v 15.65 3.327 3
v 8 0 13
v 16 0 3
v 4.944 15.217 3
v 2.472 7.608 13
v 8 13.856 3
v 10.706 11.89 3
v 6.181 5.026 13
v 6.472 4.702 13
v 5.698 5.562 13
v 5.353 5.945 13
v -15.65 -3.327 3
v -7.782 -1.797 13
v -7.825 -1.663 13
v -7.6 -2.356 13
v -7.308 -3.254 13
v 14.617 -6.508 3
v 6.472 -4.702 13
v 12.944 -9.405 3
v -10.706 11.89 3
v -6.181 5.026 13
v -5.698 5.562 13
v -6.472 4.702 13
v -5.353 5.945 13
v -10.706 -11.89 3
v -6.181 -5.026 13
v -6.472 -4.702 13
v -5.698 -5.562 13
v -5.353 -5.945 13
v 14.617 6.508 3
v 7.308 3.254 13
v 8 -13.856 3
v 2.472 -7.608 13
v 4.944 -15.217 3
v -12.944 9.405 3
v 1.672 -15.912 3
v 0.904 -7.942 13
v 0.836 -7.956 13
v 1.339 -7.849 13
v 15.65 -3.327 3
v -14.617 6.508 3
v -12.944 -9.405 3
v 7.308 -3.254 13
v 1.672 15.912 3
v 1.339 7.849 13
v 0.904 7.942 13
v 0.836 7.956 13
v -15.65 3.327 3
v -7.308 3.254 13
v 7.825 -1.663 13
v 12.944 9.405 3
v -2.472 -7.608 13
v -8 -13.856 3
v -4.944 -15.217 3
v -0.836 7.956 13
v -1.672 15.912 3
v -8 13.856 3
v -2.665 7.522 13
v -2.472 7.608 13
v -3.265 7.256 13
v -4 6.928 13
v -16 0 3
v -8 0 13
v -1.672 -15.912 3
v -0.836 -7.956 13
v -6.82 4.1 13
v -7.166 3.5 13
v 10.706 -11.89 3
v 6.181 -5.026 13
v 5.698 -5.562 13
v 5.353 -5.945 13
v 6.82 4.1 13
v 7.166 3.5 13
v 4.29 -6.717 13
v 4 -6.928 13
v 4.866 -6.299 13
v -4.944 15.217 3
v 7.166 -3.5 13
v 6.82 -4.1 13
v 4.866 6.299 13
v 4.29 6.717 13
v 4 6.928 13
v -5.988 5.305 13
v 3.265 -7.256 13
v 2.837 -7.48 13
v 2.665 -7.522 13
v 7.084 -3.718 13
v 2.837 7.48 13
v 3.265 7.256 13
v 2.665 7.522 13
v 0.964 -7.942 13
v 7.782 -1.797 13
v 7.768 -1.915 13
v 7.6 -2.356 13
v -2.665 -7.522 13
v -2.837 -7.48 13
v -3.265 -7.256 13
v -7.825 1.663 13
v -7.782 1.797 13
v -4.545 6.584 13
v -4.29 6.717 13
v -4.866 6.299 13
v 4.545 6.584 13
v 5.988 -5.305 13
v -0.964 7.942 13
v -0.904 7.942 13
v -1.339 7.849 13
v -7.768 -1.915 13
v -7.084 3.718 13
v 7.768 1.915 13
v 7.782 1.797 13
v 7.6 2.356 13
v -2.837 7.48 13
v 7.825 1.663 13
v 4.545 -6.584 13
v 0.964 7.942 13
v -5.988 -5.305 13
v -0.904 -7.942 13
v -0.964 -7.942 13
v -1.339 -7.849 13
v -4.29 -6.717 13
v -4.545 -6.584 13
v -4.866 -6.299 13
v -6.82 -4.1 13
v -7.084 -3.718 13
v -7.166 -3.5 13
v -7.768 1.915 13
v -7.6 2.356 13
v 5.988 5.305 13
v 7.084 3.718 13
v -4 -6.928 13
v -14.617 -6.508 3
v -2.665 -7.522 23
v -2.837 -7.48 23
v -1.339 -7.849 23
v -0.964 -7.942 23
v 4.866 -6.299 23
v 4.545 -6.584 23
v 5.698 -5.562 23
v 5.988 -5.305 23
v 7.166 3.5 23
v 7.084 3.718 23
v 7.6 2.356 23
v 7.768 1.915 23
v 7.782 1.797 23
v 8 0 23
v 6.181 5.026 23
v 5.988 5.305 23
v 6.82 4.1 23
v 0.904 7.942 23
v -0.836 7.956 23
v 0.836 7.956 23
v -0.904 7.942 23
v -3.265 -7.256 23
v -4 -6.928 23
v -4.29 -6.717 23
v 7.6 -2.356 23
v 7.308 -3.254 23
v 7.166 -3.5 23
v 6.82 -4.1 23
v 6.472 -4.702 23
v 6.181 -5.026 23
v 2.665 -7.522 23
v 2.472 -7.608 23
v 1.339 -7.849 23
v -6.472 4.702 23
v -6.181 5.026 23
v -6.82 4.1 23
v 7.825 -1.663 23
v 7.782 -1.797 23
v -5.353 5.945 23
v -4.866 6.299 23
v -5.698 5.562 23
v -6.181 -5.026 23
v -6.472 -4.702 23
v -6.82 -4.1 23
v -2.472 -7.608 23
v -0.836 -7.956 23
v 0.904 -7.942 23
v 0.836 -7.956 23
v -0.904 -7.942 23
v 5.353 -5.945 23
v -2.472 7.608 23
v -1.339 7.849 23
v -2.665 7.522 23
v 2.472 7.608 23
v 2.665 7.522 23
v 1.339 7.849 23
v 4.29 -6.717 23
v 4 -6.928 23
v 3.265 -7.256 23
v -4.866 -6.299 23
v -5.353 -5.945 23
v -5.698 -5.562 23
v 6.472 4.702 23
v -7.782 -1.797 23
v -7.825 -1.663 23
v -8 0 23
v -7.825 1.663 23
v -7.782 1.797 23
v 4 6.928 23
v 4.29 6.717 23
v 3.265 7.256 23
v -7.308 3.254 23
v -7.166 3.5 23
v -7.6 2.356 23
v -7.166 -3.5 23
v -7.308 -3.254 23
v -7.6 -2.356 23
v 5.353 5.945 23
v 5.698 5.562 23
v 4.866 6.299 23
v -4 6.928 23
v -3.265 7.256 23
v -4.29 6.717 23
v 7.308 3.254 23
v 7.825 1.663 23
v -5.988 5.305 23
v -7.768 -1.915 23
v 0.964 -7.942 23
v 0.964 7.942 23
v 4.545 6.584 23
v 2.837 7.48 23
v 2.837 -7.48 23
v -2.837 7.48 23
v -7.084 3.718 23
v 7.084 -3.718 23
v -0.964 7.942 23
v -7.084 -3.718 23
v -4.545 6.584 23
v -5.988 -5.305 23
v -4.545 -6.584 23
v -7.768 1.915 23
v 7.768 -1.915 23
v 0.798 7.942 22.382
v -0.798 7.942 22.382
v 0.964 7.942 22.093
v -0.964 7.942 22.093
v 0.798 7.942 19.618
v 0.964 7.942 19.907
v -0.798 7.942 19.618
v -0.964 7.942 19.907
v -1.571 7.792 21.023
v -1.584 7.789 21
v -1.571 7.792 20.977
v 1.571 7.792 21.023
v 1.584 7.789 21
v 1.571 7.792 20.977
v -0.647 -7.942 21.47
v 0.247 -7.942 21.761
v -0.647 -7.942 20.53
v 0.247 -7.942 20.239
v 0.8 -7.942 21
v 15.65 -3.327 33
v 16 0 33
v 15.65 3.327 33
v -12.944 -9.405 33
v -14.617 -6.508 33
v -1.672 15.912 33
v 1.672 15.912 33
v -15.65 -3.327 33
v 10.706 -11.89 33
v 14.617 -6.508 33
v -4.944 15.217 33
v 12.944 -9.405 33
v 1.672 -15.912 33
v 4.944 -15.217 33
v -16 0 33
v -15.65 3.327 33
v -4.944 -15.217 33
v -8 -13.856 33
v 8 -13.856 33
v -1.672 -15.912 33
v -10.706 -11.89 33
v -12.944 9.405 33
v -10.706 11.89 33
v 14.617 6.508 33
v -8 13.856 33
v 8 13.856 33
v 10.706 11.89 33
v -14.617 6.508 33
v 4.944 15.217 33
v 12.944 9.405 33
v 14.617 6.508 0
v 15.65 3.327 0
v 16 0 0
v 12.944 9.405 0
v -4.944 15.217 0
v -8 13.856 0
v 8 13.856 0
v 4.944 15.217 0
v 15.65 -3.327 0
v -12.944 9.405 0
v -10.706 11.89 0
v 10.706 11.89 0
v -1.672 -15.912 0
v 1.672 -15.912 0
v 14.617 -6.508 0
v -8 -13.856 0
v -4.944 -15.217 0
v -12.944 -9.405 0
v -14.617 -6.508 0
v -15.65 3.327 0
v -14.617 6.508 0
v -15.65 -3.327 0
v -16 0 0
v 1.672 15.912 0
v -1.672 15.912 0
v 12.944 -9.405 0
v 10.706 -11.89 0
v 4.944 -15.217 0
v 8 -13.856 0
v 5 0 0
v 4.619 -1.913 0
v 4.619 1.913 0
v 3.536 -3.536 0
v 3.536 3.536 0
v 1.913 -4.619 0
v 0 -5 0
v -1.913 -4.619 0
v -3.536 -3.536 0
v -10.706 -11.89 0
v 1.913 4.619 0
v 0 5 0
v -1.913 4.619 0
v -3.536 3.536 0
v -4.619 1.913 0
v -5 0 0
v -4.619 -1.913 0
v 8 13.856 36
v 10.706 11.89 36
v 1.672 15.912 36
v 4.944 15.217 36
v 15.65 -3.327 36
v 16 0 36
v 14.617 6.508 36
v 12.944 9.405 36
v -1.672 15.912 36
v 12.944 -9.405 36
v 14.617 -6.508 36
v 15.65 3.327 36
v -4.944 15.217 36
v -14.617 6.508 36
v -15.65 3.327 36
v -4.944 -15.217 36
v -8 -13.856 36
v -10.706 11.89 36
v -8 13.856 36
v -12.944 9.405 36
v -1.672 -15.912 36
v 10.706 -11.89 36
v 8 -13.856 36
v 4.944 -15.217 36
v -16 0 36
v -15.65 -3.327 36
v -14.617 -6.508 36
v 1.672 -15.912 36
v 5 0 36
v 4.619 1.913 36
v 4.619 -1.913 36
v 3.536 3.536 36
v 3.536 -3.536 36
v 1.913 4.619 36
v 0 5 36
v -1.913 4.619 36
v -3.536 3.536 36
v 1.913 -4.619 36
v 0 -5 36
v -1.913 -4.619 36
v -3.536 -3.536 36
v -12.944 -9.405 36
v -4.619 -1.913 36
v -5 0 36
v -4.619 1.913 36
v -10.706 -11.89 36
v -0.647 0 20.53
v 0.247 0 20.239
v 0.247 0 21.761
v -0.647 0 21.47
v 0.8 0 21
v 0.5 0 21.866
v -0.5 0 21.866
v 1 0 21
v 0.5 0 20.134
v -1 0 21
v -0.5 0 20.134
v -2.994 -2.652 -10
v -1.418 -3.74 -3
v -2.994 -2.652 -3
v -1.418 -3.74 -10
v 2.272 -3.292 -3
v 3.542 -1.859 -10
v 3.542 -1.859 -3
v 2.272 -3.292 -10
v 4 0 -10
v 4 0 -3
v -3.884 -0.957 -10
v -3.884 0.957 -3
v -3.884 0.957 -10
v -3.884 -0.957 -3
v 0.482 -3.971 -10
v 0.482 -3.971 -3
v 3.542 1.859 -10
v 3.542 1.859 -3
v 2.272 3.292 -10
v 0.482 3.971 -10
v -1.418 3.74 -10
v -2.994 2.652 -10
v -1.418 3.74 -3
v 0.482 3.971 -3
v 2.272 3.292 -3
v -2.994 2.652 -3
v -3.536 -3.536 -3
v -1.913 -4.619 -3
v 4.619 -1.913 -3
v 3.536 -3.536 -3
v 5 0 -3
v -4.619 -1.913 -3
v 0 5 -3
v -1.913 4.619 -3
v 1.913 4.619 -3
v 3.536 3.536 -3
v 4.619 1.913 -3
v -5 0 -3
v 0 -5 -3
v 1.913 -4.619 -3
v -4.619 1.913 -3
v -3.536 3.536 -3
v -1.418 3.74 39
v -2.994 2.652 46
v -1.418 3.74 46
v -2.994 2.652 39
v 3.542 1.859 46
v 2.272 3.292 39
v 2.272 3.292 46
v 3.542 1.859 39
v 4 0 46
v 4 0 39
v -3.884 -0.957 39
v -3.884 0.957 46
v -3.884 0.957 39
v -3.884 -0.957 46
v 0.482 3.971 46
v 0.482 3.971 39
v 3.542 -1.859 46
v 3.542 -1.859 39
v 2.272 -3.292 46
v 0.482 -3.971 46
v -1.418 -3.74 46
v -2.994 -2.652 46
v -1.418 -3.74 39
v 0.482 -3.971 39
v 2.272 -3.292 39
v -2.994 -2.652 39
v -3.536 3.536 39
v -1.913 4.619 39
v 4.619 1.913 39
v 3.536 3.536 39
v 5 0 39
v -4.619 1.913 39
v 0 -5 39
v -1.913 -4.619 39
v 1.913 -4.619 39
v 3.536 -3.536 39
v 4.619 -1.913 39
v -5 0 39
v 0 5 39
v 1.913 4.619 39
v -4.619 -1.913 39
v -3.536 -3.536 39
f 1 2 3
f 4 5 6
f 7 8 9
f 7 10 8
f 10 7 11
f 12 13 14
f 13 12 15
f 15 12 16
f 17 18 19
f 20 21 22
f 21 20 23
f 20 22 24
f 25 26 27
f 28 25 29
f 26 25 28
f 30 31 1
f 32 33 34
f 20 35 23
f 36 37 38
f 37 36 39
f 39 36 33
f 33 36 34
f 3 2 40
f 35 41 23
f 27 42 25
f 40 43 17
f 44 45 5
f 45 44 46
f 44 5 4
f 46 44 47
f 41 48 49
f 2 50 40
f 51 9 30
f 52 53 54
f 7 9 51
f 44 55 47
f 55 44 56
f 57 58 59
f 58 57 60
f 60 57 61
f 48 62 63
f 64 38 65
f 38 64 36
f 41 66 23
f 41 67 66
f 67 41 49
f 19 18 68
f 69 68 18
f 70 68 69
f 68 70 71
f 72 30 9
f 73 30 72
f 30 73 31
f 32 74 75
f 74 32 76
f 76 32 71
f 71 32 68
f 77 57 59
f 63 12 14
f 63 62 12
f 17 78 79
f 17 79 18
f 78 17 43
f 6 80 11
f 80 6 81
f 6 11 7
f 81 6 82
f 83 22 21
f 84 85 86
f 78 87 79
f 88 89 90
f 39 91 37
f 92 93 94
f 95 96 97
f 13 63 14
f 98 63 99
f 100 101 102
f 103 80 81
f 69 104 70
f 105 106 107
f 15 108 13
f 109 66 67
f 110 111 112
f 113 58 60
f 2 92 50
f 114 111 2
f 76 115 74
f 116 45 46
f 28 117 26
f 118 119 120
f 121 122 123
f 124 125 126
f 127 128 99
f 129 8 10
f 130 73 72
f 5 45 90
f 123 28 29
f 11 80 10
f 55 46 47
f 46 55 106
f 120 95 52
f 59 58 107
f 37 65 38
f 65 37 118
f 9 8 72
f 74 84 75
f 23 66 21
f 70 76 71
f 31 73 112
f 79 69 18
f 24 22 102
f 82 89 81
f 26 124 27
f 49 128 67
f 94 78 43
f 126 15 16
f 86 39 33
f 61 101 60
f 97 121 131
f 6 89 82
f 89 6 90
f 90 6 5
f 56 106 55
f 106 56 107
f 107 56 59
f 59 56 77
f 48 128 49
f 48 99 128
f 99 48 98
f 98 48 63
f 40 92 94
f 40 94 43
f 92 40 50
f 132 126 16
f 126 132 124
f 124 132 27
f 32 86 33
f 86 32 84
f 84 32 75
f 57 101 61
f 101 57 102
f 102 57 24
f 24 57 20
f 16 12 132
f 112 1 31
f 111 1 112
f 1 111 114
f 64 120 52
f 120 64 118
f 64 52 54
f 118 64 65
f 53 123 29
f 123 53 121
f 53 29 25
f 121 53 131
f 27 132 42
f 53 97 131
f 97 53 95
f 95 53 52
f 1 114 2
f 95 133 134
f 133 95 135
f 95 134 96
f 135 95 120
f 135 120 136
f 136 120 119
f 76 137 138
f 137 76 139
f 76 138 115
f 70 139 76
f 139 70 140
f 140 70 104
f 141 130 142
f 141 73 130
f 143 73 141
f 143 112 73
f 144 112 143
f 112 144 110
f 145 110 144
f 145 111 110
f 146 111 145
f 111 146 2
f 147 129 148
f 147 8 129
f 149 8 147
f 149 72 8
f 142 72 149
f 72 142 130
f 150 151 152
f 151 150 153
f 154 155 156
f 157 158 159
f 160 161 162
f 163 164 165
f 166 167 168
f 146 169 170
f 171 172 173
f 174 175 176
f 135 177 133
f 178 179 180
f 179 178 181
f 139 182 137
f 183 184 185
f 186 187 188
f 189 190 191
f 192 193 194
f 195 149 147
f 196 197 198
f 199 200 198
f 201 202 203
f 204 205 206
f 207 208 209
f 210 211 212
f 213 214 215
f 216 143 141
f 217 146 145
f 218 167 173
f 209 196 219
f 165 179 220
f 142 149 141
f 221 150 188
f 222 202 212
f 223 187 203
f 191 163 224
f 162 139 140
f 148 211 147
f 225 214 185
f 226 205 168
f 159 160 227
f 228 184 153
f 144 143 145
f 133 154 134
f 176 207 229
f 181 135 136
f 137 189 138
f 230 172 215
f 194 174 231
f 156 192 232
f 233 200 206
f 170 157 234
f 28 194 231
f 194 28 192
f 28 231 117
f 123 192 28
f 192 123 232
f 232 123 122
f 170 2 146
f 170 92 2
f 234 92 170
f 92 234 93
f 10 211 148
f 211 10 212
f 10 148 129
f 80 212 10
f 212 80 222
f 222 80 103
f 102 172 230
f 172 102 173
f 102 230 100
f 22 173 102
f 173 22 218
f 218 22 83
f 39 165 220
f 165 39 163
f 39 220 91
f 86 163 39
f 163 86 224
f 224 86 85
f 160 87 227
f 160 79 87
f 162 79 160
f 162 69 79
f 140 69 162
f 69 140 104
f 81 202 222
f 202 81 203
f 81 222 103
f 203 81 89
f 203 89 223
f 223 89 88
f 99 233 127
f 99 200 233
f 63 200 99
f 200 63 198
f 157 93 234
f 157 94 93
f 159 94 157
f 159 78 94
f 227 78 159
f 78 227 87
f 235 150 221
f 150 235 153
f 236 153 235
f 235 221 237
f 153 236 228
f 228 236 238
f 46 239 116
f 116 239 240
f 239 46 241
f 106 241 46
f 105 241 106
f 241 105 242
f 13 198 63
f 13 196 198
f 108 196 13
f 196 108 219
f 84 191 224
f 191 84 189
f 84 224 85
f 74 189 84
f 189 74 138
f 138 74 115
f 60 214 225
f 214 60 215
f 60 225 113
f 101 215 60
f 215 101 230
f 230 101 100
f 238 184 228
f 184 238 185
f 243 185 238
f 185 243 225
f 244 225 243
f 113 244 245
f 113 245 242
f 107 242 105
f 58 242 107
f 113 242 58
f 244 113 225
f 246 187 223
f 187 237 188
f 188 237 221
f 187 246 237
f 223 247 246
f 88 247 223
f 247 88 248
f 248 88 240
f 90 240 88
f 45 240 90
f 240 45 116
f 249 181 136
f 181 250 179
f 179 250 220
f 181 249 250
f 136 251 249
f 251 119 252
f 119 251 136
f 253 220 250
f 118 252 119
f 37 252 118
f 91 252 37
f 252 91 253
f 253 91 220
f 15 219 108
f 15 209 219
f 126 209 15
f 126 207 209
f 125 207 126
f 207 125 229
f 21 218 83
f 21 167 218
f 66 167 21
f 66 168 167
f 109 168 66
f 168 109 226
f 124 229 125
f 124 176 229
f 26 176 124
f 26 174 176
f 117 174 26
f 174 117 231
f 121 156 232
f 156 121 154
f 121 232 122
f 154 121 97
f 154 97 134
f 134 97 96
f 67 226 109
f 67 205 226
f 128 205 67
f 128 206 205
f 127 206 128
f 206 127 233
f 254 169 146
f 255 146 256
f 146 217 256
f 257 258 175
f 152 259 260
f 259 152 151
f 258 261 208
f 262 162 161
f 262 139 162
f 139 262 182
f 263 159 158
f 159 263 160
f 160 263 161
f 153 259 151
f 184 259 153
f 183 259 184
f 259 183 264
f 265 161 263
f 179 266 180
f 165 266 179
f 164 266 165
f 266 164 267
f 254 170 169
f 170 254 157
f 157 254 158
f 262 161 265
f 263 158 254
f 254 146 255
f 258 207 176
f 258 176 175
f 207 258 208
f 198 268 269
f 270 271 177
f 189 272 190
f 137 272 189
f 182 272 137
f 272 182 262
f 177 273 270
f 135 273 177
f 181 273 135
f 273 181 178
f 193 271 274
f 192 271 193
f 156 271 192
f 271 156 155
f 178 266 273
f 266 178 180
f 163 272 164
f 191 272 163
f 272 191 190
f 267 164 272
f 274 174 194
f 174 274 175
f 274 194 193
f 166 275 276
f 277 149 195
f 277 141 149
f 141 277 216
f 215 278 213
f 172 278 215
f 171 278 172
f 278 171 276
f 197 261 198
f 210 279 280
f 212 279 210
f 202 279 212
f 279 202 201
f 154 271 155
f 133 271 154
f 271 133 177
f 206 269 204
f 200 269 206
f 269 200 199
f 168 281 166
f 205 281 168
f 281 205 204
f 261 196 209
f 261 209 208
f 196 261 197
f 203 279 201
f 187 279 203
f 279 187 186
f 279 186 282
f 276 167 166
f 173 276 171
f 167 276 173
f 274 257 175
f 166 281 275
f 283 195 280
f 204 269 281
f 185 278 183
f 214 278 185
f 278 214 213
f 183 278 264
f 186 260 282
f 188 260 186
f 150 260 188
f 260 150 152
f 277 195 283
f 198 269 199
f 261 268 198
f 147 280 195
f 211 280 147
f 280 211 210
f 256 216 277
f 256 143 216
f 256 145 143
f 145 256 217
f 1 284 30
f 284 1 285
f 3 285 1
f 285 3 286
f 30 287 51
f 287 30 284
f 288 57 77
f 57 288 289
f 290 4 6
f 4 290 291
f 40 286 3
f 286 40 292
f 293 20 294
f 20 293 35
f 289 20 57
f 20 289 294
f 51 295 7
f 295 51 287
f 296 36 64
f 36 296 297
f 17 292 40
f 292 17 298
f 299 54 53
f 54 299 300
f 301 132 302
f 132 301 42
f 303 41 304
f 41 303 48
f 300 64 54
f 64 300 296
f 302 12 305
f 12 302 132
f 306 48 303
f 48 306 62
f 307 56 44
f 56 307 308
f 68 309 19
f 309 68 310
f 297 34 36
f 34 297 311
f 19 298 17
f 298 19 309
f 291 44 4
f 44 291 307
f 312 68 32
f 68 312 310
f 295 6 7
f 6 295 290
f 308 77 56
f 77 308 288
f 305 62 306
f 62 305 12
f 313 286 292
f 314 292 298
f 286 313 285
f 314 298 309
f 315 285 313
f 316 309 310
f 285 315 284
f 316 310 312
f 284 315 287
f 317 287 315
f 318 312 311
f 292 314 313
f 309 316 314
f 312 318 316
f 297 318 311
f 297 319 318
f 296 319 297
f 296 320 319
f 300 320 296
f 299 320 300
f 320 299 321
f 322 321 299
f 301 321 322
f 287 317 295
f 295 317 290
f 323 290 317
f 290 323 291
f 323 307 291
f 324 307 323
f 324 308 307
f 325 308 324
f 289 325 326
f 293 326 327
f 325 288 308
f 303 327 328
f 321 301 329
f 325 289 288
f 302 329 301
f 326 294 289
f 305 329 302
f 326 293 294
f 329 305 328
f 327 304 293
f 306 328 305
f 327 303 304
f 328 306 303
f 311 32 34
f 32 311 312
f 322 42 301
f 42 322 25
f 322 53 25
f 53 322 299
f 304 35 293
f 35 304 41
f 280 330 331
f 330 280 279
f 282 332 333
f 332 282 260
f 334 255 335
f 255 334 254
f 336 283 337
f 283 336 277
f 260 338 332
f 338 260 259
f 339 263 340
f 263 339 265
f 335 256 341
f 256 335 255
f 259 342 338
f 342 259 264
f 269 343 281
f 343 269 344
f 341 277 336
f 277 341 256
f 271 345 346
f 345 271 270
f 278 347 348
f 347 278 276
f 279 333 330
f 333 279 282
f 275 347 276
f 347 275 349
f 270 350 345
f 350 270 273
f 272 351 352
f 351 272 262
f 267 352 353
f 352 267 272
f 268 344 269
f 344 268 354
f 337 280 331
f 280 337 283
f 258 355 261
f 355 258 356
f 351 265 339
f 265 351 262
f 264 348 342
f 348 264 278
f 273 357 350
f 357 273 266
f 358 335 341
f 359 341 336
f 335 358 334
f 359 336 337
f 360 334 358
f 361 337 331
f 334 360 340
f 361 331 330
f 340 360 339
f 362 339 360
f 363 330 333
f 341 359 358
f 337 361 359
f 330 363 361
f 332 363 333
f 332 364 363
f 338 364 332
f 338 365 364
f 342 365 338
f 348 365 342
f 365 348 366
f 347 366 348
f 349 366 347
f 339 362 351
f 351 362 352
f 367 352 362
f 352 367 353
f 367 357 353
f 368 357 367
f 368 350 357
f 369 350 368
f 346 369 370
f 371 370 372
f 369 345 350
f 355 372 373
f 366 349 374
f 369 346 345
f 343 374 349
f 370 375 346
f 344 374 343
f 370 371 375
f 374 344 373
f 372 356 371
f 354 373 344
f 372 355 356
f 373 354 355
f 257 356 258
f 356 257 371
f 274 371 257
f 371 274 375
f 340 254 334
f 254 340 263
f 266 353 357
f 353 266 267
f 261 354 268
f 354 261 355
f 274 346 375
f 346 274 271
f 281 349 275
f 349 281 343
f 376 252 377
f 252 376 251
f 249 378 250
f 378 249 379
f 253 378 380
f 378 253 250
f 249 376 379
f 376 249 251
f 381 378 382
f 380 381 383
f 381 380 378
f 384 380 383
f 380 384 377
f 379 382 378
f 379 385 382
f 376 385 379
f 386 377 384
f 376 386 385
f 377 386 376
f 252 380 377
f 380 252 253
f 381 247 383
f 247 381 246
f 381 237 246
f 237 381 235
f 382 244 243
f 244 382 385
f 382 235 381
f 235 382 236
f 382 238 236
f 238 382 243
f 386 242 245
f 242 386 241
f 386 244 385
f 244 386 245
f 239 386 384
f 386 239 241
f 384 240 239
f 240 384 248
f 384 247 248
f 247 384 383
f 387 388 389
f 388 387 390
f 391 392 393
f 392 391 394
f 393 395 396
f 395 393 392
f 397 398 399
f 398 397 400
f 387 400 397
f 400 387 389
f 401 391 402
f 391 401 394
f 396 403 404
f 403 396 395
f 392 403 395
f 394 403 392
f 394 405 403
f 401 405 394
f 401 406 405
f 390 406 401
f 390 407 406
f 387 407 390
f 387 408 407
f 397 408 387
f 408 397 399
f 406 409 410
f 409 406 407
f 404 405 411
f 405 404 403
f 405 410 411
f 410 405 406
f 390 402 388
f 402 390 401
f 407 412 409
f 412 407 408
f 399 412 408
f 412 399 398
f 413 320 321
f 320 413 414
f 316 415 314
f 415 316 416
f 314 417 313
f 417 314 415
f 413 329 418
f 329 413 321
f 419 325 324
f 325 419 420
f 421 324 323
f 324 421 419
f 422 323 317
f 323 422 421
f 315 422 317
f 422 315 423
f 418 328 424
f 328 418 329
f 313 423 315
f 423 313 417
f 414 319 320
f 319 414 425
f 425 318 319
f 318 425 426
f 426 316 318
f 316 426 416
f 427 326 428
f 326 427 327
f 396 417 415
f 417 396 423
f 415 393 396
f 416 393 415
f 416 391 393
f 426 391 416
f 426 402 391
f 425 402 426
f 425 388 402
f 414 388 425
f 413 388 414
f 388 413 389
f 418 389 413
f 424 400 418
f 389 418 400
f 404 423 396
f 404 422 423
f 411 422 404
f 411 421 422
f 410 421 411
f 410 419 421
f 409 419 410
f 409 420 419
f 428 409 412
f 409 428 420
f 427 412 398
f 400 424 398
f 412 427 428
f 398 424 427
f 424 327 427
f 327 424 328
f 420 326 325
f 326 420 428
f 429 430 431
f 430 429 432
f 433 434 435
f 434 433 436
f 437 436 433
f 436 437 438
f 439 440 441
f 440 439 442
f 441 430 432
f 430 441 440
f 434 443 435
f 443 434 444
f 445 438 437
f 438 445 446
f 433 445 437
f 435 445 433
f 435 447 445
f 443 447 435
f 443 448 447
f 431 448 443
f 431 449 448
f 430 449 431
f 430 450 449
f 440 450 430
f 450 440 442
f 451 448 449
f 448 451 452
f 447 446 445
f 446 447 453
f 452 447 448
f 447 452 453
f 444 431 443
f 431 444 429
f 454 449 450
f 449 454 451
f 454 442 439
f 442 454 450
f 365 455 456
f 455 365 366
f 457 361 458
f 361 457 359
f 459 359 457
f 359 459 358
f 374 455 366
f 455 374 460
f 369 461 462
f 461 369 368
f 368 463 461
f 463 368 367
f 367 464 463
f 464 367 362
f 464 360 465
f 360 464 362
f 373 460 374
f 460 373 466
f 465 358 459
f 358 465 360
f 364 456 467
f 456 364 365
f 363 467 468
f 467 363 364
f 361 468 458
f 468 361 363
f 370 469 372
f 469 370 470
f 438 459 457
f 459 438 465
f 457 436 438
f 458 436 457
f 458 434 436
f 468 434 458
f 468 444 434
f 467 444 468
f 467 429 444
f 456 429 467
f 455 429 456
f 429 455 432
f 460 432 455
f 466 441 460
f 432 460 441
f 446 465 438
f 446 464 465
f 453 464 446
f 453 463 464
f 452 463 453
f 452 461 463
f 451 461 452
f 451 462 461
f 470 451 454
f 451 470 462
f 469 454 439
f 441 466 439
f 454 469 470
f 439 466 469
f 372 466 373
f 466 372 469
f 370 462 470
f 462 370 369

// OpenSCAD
// file: ../vitamins/bearing.scad
//from: https://github.com/openscad/MCAD/blob/master/bearing.scad
//commit 5246f78d34904f728f49ea4ea30faa5041abc592
/*
 * Bearing model.
 *
 * Originally by Hans Häggström, 2010.
 * Dual licenced under Creative Commons Attribution-Share Alike 3.0 and LGPL2 or later
 */


include <MCAD/units.scad>
include <MCAD/materials.scad>

// Example, uncomment to view
//test_bearing();
//test_bearing_hole();

module test_bearing(){
    bearing();
    bearing(pos=[5*cm, 0,0], angle=[90,0,0]);
    bearing(pos=[-2.5*cm, 0,0], model=688);
}

module test_bearing_hole(){
    difference(){
      translate([0, 0, 3.5]) cube(size=[30, 30, 7-10*epsilon], center=true);
      bearing(outline=true);
    }
}

BEARING_INNER_DIAMETER = 0;
BEARING_OUTER_DIAMETER = 1;
BEARING_WIDTH = 2;

// Common bearing names
SkateBearing = 608;

// Bearing dimensions
// model == XXX ? [inner dia, outer dia, width]:
// http://www.gizmology.net/bearings.htm has some valuable information on that
// https://www.bearingworks.com/bearing-sizes has a very exhaustive table of dimensions
function bearingDimensions(model) =
  model == 603 ? [3*mm,  9*mm,  5*mm]:
  model == 604 ? [4*mm, 12*mm,  4*mm]:
  model == 605 ? [5*mm, 14*mm,  5*mm]:
  model == 606 ? [6*mm, 17*mm,  6*mm]:
  model == 607 ? [7*mm, 19*mm,  6*mm]:
  model == 608 ? [8*mm, 22*mm,  7*mm]:
  model == 609 ? [9*mm, 24*mm,  7*mm]:

  model == 623 ? [3*mm, 10*mm,  4*mm]:
  model == 624 ? [4*mm, 13*mm,  5*mm]:
  model == 625 ? [5*mm, 16*mm,  5*mm]:
  model == 626 ? [6*mm, 19*mm,  6*mm]:
  model == 627 ? [7*mm, 22*mm,  7*mm]:
  model == 628 ? [8*mm, 24*mm,  8*mm]:
  model == 629 ? [9*mm, 26*mm,  8*mm]:

  model == 633 ? [3*mm, 13*mm,  5*mm]:
  model == 634 ? [4*mm, 16*mm,  5*mm]:
  model == 635 ? [5*mm, 19*mm,  6*mm]:
  model == 636 ? [6*mm, 22*mm,  7*mm]:
  model == 637 ? [7*mm, 26*mm,  9*mm]:
  model == 638 ? [8*mm, 28*mm,  9*mm]:
  model == 639 ? [9*mm, 30*mm, 10*mm]:

  model == 673 ? [3*mm,  6*mm,  2.5*mm]:
  model == 674 ? [4*mm,  7*mm,  2.5*mm]:
  model == 675 ? [5*mm,  8*mm,  2.5*mm]:
  model == 676 ? [6*mm, 10*mm,  3*mm]:
  model == 677 ? [7*mm, 11*mm,  3*mm]:
  model == 678 ? [8*mm, 12*mm,  3.5*mm]:

  model == 683 ? [3*mm,  7*mm,  3*mm]:
  model == 684 ? [4*mm,  9*mm,  4*mm]:
  model == 685 ? [5*mm, 11*mm,  5*mm]:
  model == 686 ? [6*mm, 13*mm,  5*mm]:
  model == 687 ? [7*mm, 14*mm,  5*mm]:
  model == 688 ? [8*mm, 16*mm,  5*mm]:
  model == 689 ? [9*mm, 17*mm,  5*mm]:

  model == 693 ? [3*mm,  8*mm,  4*mm]:
  model == 694 ? [4*mm, 11*mm,  4*mm]:
  model == 695 ? [5*mm, 13*mm,  4*mm]:
  model == 696 ? [6*mm, 15*mm,  5*mm]:
  model == 697 ? [7*mm, 17*mm,  5*mm]:
  model == 698 ? [8*mm, 19*mm,  6*mm]:
  model == 699 ? [9*mm, 20*mm,  6*mm]:

  [8*mm, 22*mm, 7*mm]; // this is the default


function bearingWidth(model) = bearingDimensions(model)[BEARING_WIDTH];
function bearingInnerDiameter(model) = bearingDimensions(model)[BEARING_INNER_DIAMETER];
function bearingOuterDiameter(model) = bearingDimensions(model)[BEARING_OUTER_DIAMETER];

module bearing(pos=[0,0,0], angle=[0,0,0], model=SkateBearing, outline=false,
                material=Steel, sideMaterial=Brass) {
  // Common bearing names
  model =
    model == "Skate" ? 608 :
    model;

  w = bearingWidth(model);
  innerD = outline==false ? bearingInnerDiameter(model) : 0;
  outerD = bearingOuterDiameter(model);

  innerRim = innerD + (outerD - innerD) * 0.2;
  outerRim = outerD - (outerD - innerD) * 0.2;
  midSink = w * 0.1;

  translate(pos) rotate(angle) union() {
    color(material)
      difference() {
        // Basic ring
        Ring([0,0,0], outerD, innerD, w, material, material);

        if (outline==false) {
          // Side shields
          Ring([0,0,-epsilon], outerRim, innerRim, epsilon+midSink, sideMaterial, material);
          Ring([0,0,w-midSink], outerRim, innerRim, epsilon+midSink, sideMaterial, material);
        }
      }
  }

  module Ring(pos, od, id, h, material, holeMaterial) {
    color(material) {
      translate(pos)
        difference() {
          cylinder(r=od/2, h=h,  $fs = 0.01);
          color(holeMaterial)
            translate([0,0,-10*epsilon])
              cylinder(r=id/2, h=h+20*epsilon,  $fs = 0.01);
        }
    }
  }

}
// main file
//Spool
use <../vitamins/bearing.scad>;

//variables
OuterRadius = 16;
InnerRadius = 8;
//BearingInnerRadius = 7.9/2;
//BearingInnerRing = 3;
//BearingOuterRadius = 22/2;
//BearingHeight = 7;
BearingInnerRadius = bearingInnerDiameter(608)/2;
BearingInnerRing = 3;
BearingOuterRadius = bearingOuterDiameter(608)/2;
BearingHeight = bearingWidth(608);

echo (BearingInnerRadius);
echo (BearingOuterRadius);
echo (BearingHeight);

SpoolCoreLenght = 30;
RingHeight = 1.5;
BoarderThickness = 3;
RopeRadius = 0.8;
Tolerance = 0.1;
SpoolHeight = SpoolCoreLenght+2*BoarderThickness; //total spool hight

// ------ top level geometry --------
spool();
//functions
function get_OuterRadius() = OuterRadius;
function get_InnerRadius() = InnerRadius;
function get_SpoolCoreLenght() = SpoolCoreLenght;
function get_BoarderThickness() = BoarderThickness;
// modules
module spool()
{
    difference()
    {
        //mainpart
        mainRoll();
        translate([0,0,SpoolHeight/2+BoarderThickness])
            rotate([90,0,0])
                ropeHole();
        
    }
    //bearing holders
    rotate([180,0,0])   bearingInnerPart();

    translate([0,0,SpoolHeight])    bearingInnerPart();
       
}

module mainRoll()
{
    rollBoarder();

    translate([0,0,BoarderThickness])
    {
        cylinder(h = SpoolCoreLenght/3, r1=OuterRadius, r2=InnerRadius);
    translate([0,0,SpoolCoreLenght/3])
        cylinder(h = SpoolCoreLenght/3, r1=InnerRadius, r2=InnerRadius);
    translate([0,0,2*SpoolCoreLenght/3])
        cylinder(h = SpoolCoreLenght/3, r1=InnerRadius, r2=OuterRadius);
    }
    translate([0,0,SpoolCoreLenght+BoarderThickness])
        rollBoarder();
}

module rollBoarder()
{
    cylinder(BoarderThickness, OuterRadius, OuterRadius);
}

module bearingInnerPart()
{
    cylinder(BearingHeight+BearingInnerRing, BearingInnerRadius, BearingInnerRadius);
    cylinder(BearingInnerRing,BearingInnerRadius+1,BearingInnerRadius+1);
}

module bearingHole()
{
    cylinder(BearingHeight+Tolerance, BearingOuterRadius+Tolerance, BearingOuterRadius+Tolerance);
    translate([0,0,BearingHeight])
        cylinder(BearingHeight/4, BearingOuterRadius+Tolerance, BearingInnerRadius+Tolerance);
}

module ropeHole()
{
    cylinder(h=InnerRadius, r=RopeRadius);
    translate([0,0,-InnerRadius])
        cylinder(InnerRadius,RopeRadius*2);
}
//-------------- END of spool-------------------
